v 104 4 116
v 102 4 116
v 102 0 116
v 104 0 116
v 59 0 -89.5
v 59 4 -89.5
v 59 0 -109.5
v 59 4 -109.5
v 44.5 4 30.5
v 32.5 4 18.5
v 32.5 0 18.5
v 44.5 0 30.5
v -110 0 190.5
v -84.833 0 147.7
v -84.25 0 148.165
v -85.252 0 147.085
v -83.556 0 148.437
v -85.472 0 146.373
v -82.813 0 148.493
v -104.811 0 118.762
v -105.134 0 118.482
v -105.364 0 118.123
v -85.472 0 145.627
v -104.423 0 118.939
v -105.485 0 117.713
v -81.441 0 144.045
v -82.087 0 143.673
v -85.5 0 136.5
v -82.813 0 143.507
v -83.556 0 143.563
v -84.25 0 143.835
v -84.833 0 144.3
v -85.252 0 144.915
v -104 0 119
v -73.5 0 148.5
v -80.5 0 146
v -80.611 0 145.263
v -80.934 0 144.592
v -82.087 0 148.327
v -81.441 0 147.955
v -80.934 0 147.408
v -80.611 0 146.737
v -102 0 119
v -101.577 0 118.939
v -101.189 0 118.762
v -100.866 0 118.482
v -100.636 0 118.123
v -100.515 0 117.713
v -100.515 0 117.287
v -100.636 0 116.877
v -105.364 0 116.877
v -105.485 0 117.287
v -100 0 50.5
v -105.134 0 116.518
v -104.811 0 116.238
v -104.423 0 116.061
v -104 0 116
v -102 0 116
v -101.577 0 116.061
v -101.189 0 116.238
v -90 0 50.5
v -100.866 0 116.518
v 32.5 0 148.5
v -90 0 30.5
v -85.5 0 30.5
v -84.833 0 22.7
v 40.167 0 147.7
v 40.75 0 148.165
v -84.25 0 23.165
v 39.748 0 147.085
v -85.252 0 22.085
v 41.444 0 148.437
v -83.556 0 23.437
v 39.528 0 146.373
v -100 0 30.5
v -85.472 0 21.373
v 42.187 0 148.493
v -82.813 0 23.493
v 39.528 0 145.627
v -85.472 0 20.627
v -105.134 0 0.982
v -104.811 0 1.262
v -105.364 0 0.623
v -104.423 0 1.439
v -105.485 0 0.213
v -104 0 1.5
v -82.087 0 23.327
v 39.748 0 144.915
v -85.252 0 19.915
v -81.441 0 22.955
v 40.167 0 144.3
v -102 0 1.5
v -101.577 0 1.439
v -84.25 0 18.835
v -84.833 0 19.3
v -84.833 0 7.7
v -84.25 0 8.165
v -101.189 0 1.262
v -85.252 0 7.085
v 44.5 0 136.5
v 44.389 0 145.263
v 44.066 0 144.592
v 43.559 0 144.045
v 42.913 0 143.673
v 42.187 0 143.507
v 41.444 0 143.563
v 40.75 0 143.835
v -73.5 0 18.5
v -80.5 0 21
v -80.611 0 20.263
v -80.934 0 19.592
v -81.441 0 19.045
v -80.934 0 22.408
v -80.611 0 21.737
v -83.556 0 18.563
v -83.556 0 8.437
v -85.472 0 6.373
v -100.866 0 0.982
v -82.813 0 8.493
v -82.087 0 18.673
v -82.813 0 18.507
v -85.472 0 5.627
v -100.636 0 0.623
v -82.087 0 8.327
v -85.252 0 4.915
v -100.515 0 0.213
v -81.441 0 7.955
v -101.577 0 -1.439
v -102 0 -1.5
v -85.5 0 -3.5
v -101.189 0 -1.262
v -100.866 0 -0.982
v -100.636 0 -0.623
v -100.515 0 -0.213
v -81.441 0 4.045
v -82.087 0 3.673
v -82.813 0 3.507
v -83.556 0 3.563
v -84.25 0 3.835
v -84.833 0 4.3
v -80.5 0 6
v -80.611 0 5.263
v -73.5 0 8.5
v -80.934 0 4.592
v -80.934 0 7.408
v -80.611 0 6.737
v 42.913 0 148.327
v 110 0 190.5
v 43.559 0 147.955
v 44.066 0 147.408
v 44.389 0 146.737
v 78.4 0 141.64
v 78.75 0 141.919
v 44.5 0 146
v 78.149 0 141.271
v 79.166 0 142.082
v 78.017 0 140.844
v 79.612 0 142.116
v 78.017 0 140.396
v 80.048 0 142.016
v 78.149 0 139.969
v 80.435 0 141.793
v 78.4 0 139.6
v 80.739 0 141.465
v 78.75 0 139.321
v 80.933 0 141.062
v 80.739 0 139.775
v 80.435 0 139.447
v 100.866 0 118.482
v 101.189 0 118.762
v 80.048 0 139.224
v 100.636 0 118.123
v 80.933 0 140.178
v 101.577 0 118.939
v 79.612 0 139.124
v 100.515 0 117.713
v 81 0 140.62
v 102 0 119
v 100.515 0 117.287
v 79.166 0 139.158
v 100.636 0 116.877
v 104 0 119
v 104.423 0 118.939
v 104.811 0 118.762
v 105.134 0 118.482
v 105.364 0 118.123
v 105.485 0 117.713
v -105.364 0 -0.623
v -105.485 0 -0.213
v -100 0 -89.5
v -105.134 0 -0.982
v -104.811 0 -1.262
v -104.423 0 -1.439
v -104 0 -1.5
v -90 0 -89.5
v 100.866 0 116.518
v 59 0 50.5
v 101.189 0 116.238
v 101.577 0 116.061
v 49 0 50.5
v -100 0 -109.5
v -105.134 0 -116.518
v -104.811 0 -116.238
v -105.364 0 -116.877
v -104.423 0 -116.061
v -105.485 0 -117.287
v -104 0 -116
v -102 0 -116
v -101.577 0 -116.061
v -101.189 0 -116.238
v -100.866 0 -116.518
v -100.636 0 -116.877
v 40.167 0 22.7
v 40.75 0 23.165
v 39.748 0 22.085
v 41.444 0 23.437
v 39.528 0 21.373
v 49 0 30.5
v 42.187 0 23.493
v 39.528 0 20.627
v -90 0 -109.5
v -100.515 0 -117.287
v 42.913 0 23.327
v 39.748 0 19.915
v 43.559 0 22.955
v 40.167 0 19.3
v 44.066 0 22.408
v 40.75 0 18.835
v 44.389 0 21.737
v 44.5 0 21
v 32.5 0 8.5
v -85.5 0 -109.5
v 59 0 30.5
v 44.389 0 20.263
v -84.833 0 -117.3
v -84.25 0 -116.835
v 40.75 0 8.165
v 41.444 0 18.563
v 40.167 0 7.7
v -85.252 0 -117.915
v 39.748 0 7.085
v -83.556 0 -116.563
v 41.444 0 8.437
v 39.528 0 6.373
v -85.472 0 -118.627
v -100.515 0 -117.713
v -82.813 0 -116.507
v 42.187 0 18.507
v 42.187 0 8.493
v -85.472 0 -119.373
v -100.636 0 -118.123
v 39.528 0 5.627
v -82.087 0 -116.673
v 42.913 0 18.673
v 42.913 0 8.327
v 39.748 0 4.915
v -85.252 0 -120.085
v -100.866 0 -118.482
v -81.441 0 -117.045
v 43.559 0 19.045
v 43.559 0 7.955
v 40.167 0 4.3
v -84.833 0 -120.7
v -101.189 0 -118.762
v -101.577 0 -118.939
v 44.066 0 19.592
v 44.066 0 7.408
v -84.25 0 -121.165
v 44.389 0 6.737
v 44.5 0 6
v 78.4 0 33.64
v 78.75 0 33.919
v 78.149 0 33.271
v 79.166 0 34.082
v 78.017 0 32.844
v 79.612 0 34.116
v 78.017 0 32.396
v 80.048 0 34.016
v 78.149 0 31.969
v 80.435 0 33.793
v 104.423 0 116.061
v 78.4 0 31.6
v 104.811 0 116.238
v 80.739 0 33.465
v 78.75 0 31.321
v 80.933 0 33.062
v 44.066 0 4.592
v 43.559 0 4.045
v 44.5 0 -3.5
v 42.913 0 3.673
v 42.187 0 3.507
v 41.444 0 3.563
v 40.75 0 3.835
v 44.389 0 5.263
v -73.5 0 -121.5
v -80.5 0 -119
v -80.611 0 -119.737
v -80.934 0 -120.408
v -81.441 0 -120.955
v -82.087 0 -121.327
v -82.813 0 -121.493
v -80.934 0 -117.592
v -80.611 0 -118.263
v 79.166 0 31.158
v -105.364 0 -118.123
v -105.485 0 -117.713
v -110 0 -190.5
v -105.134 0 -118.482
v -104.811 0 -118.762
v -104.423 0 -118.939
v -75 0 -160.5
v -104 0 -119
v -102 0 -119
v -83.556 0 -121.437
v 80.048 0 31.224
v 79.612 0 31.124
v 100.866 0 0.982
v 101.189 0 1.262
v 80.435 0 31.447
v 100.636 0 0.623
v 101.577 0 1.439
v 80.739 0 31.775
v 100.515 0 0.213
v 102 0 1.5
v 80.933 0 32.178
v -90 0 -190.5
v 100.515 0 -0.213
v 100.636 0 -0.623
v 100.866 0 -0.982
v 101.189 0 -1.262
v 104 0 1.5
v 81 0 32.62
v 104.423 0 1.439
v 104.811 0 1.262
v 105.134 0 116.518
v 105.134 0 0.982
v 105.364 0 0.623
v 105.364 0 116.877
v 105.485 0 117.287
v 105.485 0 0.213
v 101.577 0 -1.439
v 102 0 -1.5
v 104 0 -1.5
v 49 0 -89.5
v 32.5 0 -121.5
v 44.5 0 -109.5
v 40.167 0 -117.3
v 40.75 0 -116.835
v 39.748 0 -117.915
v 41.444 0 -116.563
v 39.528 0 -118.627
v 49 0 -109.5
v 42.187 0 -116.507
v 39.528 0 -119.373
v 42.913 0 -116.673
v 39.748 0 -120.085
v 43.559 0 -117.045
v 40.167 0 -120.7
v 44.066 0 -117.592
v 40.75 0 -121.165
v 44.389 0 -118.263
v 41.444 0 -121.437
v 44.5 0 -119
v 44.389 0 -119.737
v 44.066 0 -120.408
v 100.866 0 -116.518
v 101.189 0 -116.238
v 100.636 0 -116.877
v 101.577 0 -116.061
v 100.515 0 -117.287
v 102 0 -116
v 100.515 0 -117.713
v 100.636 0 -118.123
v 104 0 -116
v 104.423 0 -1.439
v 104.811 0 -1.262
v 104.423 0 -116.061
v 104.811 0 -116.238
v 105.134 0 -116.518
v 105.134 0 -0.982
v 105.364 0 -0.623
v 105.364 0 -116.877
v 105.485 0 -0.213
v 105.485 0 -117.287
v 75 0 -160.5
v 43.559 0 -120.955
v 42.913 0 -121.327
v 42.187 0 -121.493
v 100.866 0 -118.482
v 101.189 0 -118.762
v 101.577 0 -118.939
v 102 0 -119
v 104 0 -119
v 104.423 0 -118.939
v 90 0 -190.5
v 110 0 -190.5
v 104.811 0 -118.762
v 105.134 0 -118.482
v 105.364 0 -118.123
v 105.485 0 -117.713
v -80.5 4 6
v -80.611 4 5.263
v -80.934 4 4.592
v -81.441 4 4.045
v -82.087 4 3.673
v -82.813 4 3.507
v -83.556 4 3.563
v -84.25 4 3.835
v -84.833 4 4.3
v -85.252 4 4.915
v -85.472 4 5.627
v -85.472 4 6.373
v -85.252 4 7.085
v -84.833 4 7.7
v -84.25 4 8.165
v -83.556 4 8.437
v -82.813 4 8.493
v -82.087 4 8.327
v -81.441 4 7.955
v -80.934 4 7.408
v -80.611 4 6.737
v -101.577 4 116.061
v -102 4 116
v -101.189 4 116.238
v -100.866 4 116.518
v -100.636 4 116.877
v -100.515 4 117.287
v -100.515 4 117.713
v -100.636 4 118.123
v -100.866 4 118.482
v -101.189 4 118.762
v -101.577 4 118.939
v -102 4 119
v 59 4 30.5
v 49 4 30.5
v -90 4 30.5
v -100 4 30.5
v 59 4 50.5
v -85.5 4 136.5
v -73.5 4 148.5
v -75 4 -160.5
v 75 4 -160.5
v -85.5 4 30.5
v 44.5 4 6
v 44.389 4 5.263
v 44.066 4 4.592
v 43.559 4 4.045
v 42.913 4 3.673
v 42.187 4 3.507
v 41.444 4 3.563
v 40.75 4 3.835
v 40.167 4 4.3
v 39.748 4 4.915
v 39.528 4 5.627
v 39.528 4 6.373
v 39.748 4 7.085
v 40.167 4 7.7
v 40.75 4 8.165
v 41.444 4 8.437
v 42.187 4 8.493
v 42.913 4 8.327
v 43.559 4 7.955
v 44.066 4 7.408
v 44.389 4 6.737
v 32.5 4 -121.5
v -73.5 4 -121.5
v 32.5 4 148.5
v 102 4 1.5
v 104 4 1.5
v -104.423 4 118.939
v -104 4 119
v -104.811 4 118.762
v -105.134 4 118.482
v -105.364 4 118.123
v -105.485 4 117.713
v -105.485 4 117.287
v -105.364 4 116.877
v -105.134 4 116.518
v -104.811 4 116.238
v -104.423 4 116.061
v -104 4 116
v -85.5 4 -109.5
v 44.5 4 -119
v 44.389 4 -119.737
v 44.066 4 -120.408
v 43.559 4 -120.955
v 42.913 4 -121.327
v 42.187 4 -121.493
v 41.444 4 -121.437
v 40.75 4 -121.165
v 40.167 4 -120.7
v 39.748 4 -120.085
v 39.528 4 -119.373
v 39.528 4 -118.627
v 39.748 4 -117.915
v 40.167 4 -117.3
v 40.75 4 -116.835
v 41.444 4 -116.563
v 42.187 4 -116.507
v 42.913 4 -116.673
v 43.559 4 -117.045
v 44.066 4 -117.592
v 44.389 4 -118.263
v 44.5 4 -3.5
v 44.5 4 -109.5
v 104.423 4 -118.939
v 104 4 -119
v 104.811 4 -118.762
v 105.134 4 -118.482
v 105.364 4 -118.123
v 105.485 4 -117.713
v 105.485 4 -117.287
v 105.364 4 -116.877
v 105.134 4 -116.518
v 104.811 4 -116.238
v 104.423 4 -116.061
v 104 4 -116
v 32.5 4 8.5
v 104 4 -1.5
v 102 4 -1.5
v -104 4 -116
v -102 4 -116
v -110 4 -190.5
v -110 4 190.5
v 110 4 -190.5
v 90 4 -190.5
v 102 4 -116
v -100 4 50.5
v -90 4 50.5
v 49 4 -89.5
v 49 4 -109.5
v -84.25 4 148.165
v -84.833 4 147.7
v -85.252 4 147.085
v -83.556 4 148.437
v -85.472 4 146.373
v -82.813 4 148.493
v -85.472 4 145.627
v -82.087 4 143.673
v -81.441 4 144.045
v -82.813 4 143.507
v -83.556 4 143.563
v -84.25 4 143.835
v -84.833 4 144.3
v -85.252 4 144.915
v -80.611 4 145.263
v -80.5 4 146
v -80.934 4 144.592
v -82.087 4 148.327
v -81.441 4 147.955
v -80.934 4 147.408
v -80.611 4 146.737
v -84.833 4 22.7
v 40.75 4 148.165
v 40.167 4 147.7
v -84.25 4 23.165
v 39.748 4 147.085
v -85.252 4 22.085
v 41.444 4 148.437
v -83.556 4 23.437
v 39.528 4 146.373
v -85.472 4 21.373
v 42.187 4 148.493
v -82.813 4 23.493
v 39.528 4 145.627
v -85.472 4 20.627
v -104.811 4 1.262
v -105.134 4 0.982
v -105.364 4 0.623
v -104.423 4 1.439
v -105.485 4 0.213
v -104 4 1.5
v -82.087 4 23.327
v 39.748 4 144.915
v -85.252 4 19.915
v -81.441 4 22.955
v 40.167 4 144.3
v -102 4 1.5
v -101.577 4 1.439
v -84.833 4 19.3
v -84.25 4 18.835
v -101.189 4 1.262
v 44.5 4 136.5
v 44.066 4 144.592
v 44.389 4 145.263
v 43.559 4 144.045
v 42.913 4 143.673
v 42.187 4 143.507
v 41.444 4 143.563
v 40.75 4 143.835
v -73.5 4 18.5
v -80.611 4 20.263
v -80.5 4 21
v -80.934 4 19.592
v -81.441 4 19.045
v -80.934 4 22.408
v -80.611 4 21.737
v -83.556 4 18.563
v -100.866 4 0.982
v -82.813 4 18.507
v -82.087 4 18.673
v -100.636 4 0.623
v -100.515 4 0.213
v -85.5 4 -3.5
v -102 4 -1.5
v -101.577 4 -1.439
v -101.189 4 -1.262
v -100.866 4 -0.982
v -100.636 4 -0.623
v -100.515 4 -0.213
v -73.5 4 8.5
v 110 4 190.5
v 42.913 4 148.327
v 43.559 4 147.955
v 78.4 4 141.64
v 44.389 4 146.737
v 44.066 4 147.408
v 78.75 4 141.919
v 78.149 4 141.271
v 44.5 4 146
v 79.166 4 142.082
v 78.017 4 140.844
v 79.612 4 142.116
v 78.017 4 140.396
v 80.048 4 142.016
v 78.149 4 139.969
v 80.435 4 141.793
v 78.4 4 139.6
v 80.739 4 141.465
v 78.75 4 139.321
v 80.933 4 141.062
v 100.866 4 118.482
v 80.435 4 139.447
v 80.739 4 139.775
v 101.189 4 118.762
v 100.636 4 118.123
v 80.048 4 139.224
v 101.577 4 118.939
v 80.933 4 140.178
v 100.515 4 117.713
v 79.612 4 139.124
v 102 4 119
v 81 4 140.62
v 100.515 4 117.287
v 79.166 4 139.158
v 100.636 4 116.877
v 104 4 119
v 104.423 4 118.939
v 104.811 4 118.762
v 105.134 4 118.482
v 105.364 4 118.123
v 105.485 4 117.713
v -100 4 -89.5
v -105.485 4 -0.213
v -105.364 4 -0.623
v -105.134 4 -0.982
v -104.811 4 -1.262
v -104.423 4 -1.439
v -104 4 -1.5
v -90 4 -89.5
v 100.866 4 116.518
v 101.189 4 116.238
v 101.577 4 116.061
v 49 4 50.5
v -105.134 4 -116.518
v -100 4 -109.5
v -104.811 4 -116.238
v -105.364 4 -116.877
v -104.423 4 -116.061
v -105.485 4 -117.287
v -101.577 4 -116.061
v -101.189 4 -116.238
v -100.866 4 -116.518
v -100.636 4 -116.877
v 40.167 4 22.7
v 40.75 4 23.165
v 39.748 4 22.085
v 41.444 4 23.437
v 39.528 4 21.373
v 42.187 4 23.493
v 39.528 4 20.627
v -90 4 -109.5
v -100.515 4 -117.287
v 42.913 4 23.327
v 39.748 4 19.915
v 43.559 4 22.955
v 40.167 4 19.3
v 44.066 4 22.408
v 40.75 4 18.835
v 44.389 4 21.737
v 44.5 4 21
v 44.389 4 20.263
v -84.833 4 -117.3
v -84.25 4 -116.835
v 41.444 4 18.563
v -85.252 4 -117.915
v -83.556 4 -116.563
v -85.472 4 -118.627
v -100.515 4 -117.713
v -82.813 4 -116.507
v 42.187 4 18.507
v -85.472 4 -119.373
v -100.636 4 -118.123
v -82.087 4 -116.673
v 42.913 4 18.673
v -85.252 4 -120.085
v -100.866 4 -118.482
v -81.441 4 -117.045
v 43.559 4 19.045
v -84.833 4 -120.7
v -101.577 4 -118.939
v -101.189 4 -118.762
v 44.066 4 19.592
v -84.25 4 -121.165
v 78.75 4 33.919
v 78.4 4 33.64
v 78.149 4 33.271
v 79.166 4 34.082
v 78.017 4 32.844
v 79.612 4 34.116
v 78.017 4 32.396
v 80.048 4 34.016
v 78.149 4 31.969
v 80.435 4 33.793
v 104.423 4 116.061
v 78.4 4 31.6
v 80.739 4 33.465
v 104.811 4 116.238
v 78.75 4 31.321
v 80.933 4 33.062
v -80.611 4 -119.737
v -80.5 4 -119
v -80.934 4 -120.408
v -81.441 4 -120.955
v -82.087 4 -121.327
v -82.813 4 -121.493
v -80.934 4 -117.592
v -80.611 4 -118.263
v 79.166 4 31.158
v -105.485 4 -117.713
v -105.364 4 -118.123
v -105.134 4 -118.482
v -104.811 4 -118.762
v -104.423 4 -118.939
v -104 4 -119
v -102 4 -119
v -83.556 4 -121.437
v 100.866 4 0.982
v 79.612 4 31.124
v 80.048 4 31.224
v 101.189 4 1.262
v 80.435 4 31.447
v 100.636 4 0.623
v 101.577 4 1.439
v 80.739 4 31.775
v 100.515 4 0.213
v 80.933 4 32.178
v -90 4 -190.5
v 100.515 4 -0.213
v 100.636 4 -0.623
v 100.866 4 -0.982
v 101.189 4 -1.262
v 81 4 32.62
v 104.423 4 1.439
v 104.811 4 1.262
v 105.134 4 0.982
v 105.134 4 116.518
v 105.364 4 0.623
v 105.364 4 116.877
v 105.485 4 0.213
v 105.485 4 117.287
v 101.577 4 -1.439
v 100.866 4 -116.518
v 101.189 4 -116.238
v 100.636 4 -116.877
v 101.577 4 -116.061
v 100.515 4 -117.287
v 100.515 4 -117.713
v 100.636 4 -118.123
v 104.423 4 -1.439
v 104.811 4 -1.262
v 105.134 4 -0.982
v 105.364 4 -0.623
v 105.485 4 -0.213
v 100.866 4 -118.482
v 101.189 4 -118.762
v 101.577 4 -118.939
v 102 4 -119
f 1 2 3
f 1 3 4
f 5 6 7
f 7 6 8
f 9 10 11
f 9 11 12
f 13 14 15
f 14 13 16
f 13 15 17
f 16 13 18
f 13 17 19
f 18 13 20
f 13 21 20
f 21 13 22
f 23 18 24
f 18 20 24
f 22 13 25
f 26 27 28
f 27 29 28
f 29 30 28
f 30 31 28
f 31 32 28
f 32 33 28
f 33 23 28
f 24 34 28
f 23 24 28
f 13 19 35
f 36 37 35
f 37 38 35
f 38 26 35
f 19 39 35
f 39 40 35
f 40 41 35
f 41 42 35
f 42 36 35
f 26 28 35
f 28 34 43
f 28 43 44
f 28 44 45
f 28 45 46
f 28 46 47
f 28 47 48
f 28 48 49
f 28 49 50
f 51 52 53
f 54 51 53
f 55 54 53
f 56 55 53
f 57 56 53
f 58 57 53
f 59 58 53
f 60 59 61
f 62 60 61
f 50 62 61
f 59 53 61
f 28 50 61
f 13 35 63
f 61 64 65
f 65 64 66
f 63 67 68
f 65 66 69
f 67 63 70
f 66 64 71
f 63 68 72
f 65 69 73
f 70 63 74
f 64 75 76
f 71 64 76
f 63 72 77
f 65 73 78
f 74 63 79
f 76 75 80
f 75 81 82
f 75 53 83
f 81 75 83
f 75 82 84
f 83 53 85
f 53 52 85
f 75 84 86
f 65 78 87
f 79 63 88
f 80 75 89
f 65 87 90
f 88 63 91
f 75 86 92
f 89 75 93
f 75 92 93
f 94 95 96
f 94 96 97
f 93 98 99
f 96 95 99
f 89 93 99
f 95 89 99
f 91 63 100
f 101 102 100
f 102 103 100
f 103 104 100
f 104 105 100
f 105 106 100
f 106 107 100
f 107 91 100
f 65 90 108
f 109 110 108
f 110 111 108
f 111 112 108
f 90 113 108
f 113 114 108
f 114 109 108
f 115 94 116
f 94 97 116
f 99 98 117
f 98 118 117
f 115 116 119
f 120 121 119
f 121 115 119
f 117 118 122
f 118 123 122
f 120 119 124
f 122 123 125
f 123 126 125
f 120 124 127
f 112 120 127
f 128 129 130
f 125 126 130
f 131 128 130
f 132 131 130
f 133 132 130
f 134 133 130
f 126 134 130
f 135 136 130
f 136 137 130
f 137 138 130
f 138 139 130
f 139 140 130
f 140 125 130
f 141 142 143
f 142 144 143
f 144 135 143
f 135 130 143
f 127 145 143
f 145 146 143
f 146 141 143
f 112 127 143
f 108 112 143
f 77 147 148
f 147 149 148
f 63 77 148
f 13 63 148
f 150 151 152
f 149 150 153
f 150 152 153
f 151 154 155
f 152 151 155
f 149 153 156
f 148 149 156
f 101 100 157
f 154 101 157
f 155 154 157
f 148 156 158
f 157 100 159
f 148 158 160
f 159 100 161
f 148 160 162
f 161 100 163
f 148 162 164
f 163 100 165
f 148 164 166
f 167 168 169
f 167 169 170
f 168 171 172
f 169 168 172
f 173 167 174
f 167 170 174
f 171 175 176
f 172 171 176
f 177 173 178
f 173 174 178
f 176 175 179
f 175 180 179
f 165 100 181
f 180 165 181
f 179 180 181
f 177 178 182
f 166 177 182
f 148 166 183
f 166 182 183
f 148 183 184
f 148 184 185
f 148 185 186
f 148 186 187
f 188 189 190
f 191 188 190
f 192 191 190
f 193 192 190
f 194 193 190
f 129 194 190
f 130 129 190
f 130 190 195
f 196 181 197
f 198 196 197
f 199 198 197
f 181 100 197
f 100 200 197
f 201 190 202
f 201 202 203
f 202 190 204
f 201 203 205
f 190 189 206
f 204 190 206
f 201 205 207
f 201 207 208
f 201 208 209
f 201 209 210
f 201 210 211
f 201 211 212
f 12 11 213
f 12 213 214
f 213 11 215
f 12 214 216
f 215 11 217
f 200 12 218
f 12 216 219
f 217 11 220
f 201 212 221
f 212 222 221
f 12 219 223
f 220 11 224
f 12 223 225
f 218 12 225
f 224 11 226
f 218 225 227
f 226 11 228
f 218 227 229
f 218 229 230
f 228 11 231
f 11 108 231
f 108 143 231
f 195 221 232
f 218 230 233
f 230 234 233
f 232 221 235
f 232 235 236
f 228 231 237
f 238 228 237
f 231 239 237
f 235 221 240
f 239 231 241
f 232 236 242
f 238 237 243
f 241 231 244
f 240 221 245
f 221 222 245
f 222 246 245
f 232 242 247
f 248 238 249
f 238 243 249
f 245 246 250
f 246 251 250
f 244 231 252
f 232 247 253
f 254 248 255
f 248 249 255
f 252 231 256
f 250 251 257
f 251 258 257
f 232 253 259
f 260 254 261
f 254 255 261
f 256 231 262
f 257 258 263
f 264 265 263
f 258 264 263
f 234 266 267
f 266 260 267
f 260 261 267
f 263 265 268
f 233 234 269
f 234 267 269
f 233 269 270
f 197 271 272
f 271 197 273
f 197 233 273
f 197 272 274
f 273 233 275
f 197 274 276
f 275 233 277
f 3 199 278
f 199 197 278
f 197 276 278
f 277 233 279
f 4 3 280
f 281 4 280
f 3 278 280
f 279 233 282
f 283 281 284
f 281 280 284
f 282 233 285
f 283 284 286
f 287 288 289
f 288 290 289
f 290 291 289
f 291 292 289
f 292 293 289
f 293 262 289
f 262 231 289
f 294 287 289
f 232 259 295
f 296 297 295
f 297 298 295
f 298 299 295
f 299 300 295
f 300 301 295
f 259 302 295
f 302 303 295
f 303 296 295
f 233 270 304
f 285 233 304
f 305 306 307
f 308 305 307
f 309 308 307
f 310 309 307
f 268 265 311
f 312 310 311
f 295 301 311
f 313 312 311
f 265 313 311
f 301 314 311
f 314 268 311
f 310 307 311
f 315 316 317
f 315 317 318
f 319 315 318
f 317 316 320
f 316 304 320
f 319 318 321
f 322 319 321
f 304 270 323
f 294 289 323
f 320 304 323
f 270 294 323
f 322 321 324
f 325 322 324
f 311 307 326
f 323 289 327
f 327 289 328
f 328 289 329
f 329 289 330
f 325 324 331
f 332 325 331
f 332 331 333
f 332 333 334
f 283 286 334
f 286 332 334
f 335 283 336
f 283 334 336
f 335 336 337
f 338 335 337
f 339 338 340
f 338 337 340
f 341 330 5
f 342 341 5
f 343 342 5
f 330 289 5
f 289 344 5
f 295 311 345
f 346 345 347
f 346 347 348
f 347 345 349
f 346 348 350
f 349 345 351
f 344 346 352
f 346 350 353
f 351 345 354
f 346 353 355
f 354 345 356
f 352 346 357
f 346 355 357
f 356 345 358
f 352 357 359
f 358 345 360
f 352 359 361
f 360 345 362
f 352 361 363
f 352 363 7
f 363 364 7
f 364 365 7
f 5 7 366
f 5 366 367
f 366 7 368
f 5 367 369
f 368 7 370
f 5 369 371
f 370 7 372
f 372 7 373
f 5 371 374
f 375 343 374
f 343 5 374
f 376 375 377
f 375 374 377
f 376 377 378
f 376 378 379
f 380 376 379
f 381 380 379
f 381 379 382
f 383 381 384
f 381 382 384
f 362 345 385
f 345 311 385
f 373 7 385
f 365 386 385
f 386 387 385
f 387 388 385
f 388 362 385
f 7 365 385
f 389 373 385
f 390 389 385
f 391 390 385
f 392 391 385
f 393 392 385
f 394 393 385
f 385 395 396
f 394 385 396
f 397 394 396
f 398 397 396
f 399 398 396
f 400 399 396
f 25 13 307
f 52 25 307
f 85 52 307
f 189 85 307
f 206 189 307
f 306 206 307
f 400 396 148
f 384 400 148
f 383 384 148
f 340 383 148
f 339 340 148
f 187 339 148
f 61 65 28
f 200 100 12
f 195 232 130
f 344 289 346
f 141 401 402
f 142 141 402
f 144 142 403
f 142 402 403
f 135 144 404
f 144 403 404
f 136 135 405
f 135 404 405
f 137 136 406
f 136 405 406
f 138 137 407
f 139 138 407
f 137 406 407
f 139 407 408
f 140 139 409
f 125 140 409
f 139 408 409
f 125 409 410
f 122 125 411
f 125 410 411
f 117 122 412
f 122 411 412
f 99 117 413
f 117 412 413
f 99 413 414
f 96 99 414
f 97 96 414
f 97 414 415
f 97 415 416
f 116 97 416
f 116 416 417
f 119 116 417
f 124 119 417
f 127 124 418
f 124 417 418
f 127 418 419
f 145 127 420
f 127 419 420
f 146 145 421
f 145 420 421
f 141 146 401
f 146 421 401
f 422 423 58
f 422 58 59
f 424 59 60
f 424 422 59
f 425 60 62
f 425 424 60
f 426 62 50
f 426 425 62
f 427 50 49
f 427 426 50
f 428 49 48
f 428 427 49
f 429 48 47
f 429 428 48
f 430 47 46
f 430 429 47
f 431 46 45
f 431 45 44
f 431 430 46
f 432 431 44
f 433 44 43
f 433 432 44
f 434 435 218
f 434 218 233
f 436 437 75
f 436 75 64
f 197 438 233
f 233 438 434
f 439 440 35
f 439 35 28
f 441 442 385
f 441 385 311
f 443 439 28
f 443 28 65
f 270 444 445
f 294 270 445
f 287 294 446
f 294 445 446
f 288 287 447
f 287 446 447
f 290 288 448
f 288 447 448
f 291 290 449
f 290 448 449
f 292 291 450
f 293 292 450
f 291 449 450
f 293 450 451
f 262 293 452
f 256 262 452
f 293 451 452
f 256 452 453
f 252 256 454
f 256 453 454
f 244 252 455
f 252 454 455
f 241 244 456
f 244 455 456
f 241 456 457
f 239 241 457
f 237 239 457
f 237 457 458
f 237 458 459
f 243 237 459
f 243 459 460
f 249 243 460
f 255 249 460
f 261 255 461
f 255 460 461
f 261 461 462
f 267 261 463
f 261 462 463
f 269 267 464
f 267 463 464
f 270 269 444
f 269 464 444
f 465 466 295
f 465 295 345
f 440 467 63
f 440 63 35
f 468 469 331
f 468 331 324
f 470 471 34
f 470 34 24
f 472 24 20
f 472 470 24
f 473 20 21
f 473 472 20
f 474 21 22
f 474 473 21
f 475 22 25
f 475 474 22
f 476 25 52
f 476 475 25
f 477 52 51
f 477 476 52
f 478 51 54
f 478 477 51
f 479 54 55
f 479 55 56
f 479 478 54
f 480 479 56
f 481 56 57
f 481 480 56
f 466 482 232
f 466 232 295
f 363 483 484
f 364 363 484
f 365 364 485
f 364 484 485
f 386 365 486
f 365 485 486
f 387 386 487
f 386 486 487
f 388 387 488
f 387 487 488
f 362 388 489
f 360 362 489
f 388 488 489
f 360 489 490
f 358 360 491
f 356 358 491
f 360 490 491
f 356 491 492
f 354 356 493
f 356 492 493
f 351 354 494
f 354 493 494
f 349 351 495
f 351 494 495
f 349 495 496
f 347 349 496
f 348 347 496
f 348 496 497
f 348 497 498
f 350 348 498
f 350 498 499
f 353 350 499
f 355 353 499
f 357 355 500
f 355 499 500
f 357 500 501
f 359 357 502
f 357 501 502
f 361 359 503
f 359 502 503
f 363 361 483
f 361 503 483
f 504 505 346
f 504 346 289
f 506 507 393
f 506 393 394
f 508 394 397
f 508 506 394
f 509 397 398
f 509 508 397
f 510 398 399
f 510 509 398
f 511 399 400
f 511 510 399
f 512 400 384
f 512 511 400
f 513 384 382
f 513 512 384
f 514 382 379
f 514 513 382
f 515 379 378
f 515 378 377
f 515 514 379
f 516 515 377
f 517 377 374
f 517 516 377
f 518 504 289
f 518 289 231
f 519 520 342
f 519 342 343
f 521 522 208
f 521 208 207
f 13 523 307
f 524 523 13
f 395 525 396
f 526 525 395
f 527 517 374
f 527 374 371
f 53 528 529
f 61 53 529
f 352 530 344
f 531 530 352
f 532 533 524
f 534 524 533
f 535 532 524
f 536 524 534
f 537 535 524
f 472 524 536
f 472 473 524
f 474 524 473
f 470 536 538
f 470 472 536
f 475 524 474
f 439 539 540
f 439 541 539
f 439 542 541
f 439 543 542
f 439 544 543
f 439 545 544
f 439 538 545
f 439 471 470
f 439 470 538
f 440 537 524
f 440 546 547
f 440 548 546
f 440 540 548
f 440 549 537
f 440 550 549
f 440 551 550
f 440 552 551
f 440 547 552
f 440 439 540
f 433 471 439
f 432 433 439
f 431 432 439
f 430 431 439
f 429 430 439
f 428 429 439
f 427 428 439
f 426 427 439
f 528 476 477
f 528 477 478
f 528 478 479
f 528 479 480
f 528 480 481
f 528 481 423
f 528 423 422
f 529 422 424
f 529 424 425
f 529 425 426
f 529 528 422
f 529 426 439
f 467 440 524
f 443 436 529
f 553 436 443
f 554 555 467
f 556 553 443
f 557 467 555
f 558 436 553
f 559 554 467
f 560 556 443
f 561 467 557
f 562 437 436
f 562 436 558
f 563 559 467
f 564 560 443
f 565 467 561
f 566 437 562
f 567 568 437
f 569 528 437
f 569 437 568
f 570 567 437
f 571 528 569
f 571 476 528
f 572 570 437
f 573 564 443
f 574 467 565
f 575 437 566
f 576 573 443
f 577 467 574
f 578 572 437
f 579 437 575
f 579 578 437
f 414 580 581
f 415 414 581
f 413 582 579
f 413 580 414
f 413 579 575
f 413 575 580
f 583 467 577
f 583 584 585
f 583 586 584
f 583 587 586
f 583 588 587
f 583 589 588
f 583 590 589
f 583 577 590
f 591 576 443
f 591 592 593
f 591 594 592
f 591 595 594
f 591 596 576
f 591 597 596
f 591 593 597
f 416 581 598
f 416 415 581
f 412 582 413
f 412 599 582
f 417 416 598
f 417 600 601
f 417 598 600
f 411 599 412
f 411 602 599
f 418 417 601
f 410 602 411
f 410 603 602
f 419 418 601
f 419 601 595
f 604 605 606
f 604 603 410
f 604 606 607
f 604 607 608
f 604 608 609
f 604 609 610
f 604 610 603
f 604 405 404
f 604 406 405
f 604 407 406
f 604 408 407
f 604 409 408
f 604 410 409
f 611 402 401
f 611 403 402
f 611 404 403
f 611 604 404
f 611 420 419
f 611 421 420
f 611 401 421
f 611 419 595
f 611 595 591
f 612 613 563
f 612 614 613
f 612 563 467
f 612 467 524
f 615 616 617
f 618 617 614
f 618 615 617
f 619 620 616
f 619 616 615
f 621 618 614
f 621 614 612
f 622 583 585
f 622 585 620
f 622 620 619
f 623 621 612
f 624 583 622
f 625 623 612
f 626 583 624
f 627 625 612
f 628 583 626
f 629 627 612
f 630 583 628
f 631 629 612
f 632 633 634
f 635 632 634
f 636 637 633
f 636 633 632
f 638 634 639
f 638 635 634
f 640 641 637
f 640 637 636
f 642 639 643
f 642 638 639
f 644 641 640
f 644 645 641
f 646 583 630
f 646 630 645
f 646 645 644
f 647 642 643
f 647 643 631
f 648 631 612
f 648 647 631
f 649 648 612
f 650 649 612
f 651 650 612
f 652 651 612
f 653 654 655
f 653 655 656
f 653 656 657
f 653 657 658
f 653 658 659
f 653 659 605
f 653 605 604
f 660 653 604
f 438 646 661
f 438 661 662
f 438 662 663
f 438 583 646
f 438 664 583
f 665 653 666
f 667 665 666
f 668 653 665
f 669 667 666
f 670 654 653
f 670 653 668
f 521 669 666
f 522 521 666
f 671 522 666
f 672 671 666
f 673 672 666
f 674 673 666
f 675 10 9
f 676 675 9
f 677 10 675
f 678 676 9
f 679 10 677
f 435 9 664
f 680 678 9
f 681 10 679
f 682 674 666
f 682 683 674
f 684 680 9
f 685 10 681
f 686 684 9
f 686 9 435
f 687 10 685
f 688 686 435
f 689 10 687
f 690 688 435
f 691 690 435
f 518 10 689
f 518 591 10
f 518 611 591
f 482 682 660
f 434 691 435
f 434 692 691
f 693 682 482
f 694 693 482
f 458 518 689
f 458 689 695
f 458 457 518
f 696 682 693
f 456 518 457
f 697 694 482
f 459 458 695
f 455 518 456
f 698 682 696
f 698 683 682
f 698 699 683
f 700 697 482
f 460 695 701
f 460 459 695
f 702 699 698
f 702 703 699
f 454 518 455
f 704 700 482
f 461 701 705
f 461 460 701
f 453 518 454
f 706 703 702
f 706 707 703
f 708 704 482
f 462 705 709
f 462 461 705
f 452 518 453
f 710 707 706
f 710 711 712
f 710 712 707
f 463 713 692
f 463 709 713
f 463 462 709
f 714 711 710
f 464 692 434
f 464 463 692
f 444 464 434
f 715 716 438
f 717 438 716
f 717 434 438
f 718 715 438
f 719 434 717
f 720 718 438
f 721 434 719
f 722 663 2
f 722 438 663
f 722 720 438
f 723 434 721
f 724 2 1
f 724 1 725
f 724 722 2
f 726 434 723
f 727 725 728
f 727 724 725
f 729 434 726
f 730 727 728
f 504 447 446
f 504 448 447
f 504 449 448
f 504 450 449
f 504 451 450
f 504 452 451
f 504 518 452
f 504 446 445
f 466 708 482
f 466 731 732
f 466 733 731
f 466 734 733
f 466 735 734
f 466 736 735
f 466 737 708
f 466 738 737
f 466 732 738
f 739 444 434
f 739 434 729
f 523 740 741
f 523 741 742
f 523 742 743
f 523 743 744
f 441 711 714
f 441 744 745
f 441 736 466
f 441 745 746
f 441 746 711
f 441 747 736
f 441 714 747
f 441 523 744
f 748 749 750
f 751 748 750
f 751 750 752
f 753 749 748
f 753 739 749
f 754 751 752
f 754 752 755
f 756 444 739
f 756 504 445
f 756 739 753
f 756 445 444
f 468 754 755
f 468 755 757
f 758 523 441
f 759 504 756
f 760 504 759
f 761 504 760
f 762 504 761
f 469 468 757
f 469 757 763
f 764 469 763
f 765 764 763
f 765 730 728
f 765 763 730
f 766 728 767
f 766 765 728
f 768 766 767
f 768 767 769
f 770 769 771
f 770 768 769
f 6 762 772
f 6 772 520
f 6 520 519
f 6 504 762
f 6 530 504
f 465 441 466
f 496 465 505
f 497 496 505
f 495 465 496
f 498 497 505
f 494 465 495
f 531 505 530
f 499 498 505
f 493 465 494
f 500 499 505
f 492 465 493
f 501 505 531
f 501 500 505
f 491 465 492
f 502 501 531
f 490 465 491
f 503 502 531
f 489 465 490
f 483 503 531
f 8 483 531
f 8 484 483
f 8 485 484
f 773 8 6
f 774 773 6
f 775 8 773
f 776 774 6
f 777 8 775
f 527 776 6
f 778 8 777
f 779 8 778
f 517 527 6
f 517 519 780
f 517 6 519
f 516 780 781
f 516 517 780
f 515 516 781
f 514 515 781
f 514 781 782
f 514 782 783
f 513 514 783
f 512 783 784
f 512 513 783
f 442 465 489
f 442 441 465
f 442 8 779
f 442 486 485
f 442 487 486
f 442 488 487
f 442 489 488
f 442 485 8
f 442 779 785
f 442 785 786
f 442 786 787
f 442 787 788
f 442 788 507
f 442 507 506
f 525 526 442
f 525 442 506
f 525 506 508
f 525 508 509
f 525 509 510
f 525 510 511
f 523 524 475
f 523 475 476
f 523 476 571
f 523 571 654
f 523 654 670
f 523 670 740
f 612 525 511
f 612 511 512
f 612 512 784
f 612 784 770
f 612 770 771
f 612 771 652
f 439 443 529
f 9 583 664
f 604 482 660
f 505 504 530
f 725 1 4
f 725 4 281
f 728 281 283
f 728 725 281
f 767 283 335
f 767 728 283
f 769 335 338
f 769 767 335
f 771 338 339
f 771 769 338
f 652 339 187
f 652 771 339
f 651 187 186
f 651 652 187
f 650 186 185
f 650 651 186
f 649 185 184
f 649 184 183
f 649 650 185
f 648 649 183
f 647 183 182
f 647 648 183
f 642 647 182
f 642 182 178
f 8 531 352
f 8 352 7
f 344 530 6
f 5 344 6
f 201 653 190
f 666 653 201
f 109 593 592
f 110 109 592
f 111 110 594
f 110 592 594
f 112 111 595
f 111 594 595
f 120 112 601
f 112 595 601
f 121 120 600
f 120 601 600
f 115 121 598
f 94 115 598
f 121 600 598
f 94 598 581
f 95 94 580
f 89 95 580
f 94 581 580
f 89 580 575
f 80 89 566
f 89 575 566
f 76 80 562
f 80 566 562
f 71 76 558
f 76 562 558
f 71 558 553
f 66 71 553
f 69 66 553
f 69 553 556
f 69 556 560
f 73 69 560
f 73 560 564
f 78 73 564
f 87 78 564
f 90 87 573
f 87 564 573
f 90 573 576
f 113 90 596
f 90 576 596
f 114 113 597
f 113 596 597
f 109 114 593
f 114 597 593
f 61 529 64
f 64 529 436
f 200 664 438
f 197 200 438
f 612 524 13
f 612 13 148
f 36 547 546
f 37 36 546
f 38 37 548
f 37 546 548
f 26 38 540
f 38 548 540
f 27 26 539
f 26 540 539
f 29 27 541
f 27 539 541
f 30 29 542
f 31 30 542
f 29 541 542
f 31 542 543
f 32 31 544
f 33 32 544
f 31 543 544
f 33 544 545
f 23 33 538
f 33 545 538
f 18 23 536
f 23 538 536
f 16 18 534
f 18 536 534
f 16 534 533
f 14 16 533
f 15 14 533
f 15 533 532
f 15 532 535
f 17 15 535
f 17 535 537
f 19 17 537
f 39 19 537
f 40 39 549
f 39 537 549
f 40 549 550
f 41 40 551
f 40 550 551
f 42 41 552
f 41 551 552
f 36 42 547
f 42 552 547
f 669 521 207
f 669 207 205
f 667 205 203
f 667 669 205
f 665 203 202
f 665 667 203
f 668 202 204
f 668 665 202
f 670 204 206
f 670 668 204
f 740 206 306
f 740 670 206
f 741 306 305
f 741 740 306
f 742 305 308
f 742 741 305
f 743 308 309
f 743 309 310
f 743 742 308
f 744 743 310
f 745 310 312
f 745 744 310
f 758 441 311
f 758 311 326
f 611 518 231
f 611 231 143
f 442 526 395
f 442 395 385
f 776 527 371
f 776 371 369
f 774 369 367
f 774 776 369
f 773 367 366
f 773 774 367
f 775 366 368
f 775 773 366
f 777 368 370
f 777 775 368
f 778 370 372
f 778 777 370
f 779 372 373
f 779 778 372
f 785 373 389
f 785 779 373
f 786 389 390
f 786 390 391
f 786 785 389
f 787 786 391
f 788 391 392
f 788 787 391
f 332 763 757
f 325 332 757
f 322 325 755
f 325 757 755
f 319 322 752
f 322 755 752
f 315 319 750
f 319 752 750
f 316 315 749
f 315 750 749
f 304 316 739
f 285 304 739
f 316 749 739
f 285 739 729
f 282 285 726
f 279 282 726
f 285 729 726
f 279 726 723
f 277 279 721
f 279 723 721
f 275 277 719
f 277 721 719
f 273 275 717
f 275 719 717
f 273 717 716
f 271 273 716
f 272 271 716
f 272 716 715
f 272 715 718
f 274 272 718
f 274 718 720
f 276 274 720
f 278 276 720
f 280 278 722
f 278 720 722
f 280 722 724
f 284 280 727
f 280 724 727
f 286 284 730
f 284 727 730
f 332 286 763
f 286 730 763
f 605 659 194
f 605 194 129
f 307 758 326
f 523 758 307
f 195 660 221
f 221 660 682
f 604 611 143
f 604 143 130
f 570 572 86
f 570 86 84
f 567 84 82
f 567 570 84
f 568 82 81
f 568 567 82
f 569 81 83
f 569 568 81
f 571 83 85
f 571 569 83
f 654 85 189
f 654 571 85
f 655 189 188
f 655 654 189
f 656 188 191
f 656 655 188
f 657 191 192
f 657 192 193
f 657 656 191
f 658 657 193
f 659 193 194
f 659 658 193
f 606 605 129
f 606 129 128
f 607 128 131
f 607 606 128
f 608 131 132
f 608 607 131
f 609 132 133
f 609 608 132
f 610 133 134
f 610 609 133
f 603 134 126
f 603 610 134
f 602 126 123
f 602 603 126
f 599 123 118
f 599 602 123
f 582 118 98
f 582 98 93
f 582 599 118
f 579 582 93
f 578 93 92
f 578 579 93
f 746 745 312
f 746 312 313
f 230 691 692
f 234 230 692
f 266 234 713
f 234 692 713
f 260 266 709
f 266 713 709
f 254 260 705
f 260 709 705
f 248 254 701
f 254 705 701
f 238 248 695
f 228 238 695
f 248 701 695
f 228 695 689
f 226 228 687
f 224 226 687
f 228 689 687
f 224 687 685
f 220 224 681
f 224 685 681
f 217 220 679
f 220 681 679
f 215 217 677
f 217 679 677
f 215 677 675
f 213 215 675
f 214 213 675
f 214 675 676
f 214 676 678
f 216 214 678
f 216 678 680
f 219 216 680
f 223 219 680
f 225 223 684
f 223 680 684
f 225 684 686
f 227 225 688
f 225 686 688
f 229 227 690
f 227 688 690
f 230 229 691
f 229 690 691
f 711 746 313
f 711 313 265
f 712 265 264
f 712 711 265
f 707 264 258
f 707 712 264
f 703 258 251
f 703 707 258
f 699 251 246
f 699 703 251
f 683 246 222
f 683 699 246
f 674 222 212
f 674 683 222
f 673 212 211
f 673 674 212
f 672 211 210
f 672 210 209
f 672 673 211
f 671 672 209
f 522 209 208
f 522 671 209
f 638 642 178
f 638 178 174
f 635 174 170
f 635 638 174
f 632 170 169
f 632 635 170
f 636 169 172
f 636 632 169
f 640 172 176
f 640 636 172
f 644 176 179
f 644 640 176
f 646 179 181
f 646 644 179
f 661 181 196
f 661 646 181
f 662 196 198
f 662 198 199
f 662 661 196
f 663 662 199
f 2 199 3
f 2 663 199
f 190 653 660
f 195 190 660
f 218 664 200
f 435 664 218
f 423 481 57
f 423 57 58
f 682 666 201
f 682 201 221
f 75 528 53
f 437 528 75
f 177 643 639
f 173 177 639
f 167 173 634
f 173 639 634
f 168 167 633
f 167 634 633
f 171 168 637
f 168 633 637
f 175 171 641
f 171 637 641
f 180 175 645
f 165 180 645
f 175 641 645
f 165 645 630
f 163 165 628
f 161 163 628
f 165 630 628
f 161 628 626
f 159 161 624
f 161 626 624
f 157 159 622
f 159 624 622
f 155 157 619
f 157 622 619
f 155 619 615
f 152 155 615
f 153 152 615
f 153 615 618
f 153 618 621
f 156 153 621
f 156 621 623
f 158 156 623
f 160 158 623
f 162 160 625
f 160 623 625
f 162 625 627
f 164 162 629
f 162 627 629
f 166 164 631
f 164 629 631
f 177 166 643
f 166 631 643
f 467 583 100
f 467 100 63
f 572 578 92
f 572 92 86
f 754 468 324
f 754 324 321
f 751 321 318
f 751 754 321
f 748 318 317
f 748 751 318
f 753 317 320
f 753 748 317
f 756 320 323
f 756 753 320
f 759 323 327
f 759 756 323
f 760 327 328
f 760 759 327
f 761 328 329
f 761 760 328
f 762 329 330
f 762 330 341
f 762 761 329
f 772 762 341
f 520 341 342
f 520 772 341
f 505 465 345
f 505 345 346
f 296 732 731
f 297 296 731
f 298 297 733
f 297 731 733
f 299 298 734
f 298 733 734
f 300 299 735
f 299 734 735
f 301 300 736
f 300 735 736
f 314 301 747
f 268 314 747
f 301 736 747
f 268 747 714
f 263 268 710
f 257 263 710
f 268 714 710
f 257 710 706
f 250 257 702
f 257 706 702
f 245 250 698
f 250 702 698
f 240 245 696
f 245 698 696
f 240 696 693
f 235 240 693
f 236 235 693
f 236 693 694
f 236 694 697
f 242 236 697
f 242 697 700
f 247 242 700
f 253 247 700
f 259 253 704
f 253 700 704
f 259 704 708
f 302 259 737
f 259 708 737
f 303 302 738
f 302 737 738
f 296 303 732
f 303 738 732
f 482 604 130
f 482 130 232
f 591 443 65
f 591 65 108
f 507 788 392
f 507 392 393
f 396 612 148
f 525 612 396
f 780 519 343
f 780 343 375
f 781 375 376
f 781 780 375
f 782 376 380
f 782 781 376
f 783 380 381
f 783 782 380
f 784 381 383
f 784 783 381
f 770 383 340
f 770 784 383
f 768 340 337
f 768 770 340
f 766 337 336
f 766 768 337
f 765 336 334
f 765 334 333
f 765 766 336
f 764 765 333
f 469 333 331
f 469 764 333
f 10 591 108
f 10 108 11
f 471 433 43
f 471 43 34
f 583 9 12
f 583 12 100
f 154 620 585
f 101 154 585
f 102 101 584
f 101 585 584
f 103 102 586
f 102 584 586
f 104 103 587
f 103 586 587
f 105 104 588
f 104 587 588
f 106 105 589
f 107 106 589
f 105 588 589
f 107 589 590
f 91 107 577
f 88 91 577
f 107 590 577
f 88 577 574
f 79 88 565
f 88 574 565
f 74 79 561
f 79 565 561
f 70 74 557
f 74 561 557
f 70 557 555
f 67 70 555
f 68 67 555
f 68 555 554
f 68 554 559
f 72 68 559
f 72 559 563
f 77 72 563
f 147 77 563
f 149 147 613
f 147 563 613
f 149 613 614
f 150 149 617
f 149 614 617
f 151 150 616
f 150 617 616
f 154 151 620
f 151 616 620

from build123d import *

# Parameters (mm, degrees)
SKETCH_1_R      = 1.5
SKETCH_1_R_2    = 2.5
SKETCH_1_W      = 10
SKETCH_1_H      = 20
EXTRUDE_1_DEPTH = 4


with BuildPart() as part:
    # 草圖1 → 填料-伸長1 (new body)
    with BuildSketch(Plane(origin=(0, 4, 0), x_dir=(1, 0, 0), z_dir=(0, 1, 0))):
        Polygon((-75, 160.5), (-90, 190.5), (-110, 190.5), (-110, -190.5), (110, -190.5), (110, 190.5), (90, 190.5), (75, 160.5), align=None)
        with Locations((79.5, -32.62)):
            Circle(SKETCH_1_R, mode=Mode.SUBTRACT)
        with Locations((79.5, -140.62)):
            Circle(SKETCH_1_R, mode=Mode.SUBTRACT)
        with Locations((-83, -6)):
            Circle(SKETCH_1_R_2, mode=Mode.SUBTRACT)
        with Locations((42, -21)):
            Circle(SKETCH_1_R_2, mode=Mode.SUBTRACT)
        with Locations((42, -146)):
            Circle(SKETCH_1_R_2, mode=Mode.SUBTRACT)
        with Locations((-83, -146)):
            Circle(SKETCH_1_R_2, mode=Mode.SUBTRACT)
        with Locations((-83, 119)):
            Circle(SKETCH_1_R_2, mode=Mode.SUBTRACT)
        with Locations((42, -6)):
            Circle(SKETCH_1_R_2, mode=Mode.SUBTRACT)
        with Locations((-83, -21)):
            Circle(SKETCH_1_R_2, mode=Mode.SUBTRACT)
        with Locations((42, 119)):
            Circle(SKETCH_1_R_2, mode=Mode.SUBTRACT)
        with BuildLine():
            Line((-104, 1.5), (-102, 1.5))
            ThreePointArc((-102, 1.5), (-100.5, 0), (-102, -1.5))
            Line((-102, -1.5), (-104, -1.5))
            ThreePointArc((-104, -1.5), (-105.5, 0), (-104, 1.5))
        make_face(mode=Mode.SUBTRACT)
        with BuildLine():
            Line((102, -116), (104, -116))
            ThreePointArc((104, -116), (105.5, -117.5), (104, -119))
            Line((104, -119), (102, -119))
            ThreePointArc((102, -119), (100.5, -117.5), (102, -116))
        make_face(mode=Mode.SUBTRACT)
        with BuildLine():
            Line((102, 1.5), (104, 1.5))
            ThreePointArc((104, 1.5), (105.5, 0), (104, -1.5))
            Line((104, -1.5), (102, -1.5))
            ThreePointArc((102, -1.5), (100.5, 0), (102, 1.5))
        make_face(mode=Mode.SUBTRACT)
        with BuildLine():
            Line((102, 119), (104, 119))
            ThreePointArc((104, 119), (105.5, 117.5), (104, 116))
            Line((104, 116), (102, 116))
            ThreePointArc((102, 116), (100.5, 117.5), (102, 119))
        make_face(mode=Mode.SUBTRACT)
        with BuildLine():
            Line((-104, -116), (-102, -116))
            ThreePointArc((-102, -116), (-100.5, -117.5), (-102, -119))
            Line((-102, -119), (-104, -119))
            ThreePointArc((-104, -119), (-105.5, -117.5), (-104, -116))
        make_face(mode=Mode.SUBTRACT)
        with BuildLine():
            Line((-104, 119), (-102, 119))
            ThreePointArc((-102, 119), (-100.5, 117.5), (-102, 116))
            Line((-102, 116), (-104, 116))
            ThreePointArc((-104, 116), (-105.5, 117.5), (-104, 119))
        make_face(mode=Mode.SUBTRACT)
        Polygon((-85.5, 3.5), (-85.5, 109.5), (-73.5, 121.5), (32.5, 121.5), (44.5, 109.5), (44.5, 3.5), (32.5, -8.5), (-73.5, -8.5), align=None, mode=Mode.SUBTRACT)
        Polygon((-85.5, -30.5), (-73.5, -18.5), (32.5, -18.5), (44.5, -30.5), (44.5, -136.5), (32.5, -148.5), (-73.5, -148.5), (-85.5, -136.5), align=None, mode=Mode.SUBTRACT)
        with Locations((-95, 99.5)):
            Rectangle(SKETCH_1_W, SKETCH_1_H, mode=Mode.SUBTRACT)
        with Locations((54, 99.5)):
            Rectangle(SKETCH_1_W, SKETCH_1_H, mode=Mode.SUBTRACT)
        with Locations((54, -40.5)):
            Rectangle(SKETCH_1_W, SKETCH_1_H, mode=Mode.SUBTRACT)
        with Locations((-95, -40.5)):
            Rectangle(SKETCH_1_W, SKETCH_1_H, mode=Mode.SUBTRACT)
    extrude(amount=-EXTRUDE_1_DEPTH)


solid = part.part
